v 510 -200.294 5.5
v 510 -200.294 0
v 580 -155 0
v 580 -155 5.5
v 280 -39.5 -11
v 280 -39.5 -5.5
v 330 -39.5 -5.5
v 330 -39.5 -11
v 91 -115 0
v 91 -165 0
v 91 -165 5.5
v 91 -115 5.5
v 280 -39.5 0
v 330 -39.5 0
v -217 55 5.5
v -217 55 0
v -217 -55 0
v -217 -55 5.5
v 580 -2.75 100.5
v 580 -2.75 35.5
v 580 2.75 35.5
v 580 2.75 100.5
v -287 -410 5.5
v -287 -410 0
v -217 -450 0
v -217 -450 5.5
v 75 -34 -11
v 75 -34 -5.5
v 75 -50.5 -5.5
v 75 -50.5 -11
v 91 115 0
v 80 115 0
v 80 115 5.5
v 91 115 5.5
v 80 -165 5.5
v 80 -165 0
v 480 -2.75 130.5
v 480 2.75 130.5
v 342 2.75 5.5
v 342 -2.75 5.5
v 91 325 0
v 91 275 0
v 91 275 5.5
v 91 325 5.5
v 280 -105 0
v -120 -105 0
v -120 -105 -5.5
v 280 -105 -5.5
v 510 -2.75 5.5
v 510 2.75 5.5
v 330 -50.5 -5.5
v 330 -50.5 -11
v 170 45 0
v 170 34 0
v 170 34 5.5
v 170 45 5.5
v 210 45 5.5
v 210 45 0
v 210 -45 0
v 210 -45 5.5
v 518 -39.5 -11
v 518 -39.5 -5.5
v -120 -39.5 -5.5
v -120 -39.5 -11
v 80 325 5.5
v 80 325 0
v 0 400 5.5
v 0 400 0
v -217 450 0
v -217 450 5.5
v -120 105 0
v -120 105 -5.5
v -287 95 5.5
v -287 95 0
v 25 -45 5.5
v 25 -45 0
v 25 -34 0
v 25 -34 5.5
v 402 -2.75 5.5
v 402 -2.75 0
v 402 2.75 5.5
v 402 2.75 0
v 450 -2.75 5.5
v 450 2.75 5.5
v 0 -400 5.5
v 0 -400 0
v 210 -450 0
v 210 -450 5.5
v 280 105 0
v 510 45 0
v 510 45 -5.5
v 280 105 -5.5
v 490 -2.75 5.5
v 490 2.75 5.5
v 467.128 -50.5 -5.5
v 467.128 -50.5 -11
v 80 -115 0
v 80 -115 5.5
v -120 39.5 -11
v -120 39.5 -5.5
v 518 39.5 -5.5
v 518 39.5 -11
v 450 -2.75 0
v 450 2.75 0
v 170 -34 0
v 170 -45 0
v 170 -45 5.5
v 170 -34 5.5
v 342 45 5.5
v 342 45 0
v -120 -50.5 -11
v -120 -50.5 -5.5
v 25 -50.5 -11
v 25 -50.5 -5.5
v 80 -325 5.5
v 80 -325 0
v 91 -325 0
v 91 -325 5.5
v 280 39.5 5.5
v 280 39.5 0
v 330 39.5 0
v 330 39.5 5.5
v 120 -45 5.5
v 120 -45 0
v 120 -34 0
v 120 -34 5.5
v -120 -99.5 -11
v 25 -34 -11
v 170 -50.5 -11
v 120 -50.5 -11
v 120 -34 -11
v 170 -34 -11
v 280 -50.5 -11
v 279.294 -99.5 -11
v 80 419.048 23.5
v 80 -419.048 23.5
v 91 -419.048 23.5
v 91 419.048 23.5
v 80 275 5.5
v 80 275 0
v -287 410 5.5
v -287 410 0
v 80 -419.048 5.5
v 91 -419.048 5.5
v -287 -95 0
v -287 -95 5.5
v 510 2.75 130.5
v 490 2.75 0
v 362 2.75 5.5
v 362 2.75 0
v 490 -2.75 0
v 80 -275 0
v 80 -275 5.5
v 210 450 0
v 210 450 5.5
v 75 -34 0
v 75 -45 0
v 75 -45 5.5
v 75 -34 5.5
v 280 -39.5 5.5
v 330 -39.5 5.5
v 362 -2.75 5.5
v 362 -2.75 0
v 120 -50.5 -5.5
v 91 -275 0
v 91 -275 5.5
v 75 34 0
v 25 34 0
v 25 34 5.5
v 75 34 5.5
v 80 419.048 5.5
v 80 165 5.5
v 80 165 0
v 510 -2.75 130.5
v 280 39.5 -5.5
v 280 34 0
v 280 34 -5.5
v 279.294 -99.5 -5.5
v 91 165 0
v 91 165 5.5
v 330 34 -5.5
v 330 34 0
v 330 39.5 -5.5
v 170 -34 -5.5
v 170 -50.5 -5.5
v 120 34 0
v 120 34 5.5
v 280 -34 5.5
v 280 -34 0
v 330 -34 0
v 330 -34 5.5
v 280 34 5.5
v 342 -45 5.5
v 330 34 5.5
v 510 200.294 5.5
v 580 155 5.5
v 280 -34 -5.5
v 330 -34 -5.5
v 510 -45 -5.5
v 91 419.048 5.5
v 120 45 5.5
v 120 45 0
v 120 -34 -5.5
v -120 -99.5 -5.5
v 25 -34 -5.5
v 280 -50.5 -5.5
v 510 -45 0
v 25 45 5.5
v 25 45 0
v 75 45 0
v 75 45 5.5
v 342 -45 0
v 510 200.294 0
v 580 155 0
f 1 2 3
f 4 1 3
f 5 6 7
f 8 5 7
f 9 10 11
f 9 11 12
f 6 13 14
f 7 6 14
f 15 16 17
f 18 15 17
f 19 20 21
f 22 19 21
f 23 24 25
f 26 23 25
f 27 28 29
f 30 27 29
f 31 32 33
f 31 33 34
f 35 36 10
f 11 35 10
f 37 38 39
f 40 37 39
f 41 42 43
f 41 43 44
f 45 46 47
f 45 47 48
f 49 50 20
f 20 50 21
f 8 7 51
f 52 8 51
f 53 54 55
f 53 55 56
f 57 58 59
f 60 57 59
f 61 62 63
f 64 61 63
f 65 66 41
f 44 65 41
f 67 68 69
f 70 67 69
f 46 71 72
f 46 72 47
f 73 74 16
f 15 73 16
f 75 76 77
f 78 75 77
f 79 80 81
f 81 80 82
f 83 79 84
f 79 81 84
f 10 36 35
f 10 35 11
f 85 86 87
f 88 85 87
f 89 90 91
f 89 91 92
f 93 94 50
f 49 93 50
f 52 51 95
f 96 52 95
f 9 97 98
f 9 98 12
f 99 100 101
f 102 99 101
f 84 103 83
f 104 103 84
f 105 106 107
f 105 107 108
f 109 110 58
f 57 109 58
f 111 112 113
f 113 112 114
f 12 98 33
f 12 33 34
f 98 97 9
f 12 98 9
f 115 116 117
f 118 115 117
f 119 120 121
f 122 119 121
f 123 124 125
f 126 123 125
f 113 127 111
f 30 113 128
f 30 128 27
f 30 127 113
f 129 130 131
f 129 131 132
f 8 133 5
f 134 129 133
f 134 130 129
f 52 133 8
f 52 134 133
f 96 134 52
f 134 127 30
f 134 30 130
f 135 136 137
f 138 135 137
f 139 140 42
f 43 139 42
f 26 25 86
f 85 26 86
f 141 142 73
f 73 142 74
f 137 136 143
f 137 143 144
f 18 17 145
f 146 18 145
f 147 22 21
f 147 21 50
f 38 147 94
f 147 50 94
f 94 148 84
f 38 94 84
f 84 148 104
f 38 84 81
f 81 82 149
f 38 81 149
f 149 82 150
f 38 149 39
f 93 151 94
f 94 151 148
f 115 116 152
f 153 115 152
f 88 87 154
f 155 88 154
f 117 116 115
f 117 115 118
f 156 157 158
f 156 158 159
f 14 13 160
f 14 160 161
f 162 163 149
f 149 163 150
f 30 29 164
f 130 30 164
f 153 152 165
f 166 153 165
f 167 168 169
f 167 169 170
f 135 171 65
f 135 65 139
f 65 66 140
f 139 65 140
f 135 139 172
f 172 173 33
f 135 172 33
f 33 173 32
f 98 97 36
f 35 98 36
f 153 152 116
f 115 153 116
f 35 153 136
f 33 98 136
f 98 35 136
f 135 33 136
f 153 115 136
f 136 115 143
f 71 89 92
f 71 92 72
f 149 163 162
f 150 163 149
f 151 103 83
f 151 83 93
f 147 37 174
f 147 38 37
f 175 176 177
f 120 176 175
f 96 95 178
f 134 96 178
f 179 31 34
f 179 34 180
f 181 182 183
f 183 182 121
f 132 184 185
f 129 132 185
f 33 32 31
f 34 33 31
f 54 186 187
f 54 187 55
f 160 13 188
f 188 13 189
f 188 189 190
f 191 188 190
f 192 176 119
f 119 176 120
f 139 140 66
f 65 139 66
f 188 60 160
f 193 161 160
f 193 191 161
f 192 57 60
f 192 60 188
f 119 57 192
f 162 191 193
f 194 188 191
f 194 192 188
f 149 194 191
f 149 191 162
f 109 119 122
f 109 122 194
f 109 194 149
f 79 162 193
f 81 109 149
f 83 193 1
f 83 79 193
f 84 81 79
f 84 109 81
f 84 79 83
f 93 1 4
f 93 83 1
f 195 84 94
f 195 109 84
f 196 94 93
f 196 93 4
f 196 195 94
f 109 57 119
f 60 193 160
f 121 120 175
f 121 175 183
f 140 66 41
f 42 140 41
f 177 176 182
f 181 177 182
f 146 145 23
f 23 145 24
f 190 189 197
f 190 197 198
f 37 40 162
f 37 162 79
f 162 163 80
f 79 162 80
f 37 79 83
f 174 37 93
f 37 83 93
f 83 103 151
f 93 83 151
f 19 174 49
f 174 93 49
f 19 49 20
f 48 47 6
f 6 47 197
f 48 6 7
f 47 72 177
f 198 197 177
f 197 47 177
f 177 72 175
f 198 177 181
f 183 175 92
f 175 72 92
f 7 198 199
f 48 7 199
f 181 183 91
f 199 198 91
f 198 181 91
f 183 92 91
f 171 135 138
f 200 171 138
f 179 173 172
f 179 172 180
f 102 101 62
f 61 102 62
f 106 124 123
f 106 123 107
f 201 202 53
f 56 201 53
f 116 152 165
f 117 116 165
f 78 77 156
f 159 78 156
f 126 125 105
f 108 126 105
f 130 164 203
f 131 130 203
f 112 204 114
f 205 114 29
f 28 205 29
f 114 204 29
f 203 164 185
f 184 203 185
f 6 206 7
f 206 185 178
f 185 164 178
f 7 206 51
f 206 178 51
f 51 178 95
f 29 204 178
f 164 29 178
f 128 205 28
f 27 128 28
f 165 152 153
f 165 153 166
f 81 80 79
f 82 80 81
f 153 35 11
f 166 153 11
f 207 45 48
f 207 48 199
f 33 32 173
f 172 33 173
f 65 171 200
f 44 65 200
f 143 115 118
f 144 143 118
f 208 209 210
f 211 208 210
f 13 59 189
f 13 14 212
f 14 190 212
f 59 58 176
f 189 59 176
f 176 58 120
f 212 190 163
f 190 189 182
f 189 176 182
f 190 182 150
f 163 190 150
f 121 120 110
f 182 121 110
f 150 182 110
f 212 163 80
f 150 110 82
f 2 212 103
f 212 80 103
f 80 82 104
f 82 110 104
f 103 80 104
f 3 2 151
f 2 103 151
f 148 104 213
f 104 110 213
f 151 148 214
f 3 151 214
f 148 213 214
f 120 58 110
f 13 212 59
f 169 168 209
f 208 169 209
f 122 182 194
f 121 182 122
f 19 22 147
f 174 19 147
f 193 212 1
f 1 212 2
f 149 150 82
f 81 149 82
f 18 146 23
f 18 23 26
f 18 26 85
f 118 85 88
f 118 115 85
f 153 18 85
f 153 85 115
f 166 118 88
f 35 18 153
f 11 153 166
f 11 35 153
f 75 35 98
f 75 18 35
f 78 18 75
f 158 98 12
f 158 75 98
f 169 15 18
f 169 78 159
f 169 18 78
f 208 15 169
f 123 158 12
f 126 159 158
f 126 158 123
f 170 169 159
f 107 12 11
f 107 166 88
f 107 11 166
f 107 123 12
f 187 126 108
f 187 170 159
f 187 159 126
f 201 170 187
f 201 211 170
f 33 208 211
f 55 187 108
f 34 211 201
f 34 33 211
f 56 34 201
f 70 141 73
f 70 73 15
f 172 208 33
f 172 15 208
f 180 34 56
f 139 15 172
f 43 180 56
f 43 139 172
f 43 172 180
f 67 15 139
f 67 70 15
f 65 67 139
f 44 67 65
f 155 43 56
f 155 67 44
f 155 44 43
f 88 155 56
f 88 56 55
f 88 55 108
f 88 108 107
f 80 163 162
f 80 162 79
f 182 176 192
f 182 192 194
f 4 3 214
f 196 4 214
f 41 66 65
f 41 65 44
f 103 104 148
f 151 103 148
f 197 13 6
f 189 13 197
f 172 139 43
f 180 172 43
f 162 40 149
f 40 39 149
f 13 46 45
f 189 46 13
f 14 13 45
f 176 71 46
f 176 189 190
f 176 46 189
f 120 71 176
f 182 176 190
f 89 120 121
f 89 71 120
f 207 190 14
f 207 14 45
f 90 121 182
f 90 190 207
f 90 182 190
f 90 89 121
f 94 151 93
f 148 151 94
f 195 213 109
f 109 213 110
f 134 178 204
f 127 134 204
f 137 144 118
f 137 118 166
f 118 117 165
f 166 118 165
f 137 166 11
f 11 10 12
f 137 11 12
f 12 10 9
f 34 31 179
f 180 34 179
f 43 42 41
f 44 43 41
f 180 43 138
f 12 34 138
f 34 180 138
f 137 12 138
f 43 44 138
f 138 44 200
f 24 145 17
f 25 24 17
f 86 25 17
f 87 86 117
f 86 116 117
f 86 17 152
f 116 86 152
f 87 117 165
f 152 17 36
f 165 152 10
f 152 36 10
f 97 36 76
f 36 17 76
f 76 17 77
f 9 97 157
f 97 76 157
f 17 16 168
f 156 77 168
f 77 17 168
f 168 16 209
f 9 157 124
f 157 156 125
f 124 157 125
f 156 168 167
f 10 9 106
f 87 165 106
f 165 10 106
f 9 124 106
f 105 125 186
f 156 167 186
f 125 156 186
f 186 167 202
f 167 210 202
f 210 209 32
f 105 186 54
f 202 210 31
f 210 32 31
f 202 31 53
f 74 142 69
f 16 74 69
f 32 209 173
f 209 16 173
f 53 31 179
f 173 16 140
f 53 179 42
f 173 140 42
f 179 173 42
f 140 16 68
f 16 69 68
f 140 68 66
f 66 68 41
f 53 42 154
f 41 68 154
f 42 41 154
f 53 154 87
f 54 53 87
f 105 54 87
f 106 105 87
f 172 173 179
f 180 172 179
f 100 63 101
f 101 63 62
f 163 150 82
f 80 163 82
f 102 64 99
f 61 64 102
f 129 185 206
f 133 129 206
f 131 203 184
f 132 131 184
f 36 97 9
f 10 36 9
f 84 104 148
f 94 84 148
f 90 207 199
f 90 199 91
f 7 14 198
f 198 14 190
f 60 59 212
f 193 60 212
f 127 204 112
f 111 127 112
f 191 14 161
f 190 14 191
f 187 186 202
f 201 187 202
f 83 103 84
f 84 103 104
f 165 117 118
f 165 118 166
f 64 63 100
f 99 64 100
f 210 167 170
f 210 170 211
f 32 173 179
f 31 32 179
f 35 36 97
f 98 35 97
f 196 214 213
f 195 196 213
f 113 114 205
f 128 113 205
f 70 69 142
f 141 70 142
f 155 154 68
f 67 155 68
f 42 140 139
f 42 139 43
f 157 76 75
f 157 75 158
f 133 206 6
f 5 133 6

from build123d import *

# Parameters (mm, degrees)
F0_W      = 11
F0_H      = 50
F0_W_2    = 50
F0_H_2    = 11
F1_DEPTH  = 5.5
F2_W      = 11
F2_H      = 94.0476190476
F2_H_2    = 50
F2_H_3    = 110
F2_H_4    = 230
F3_DEPTH  = 18
F4_DEPTH  = 5.5
F5_W      = 50
F5_H      = 5.5
F5_W_2    = 120
F5_H_2    = 60
F6_DEPTH  = 5.5
F8_DEPTH  = 5.5
F9_W      = 50
F9_H      = 5.5
F9_W_2    = 40
F10_DEPTH = 5.5
F11_W     = 40
F11_H     = 5.5
F11_W_2   = 48
F11_W_3   = 20
F12_DEPTH = 125
F13_DEPTH = 5.5
F15_DEPTH = 5.5
F16_W     = 50
F16_H     = 5.5
F17_DEPTH = 5.5


# Not quite as in the source:
# - a feature names something its author has since deleted; it is built from what else it names


with BuildPart() as f1:
    # F0 (on Top) → F1 (new body)
    with BuildSketch(Plane.XY):
        Polygon((0, -400), (0, 0), (0, 400), (-217, 450), (-217, 400), (-217, 55), (-217, -55), (-217, -450), align=None)
        Polygon((-217, 400), (-217, 450), (-287, 410), (-287, 95), (-217, 55), align=None)
        Polygon((0, 400), (0, 0), (0, -400), (210, -450), (210, 0), (210, 450), align=None)
        with Locations((85.5, -300)):
            Rectangle(F0_W, F0_H, mode=Mode.SUBTRACT)
        with Locations((85.5, -140)):
            Rectangle(F0_W, F0_H, mode=Mode.SUBTRACT)
        with Locations((50, -39.5)):
            Rectangle(F0_W_2, F0_H_2, mode=Mode.SUBTRACT)
        with Locations((145, -39.5)):
            Rectangle(F0_W_2, F0_H_2, mode=Mode.SUBTRACT)
        with Locations((50, 39.5)):
            Rectangle(F0_W_2, F0_H_2, mode=Mode.SUBTRACT)
        with Locations((85.5, 140)):
            Rectangle(F0_W, F0_H, mode=Mode.SUBTRACT)
        with Locations((145, 39.5)):
            Rectangle(F0_W_2, F0_H_2, mode=Mode.SUBTRACT)
        with Locations((85.5, 300)):
            Rectangle(F0_W, F0_H, mode=Mode.SUBTRACT)
        Polygon((-287, -410), (-217, -450), (-217, -55), (-287, -95), align=None)
    extrude(amount=F1_DEPTH)


with BuildPart() as f3:
    # F2 (on face) → F3 (new body)
    with BuildSketch(Plane.XY.offset(5.5)):
        with Locations((85.5, -372.0238095238)):
            Rectangle(F2_W, F2_H)
        with Locations((85.5, -300)):
            Rectangle(F2_W, F2_H_2)
        with Locations((85.5, -220)):
            Rectangle(F2_W, F2_H_3)
        with Locations((85.5, -140)):
            Rectangle(F2_W, F2_H_2)
        with Locations((85.5, 0)):
            Rectangle(F2_W, F2_H_4)
        with Locations((85.5, 140)):
            Rectangle(F2_W, F2_H_2)
        with Locations((85.5, 220)):
            Rectangle(F2_W, F2_H_3)
        with Locations((85.5, 372.0238095238)):
            Rectangle(F2_W, F2_H)
        with Locations((85.5, 300)):
            Rectangle(F2_W, F2_H_2)
    extrude(amount=F3_DEPTH)

    # F0 (on Top) → F4 (join)
    with BuildSketch(Plane.XY):
        with Locations((85.5, -300)):
            Rectangle(F0_W, F0_H)
        with Locations((85.5, -140)):
            Rectangle(F0_W, F0_H)
        with Locations((85.5, 140)):
            Rectangle(F0_W, F0_H)
        with Locations((85.5, 300)):
            Rectangle(F0_W, F0_H)
    extrude(amount=F4_DEPTH)


with BuildPart() as f6:
    # F5 (on face) → F6 (new body)
    with BuildSketch(Plane.XY):
        Polygon((280, -105), (510, -45), (210, -45), (170, -45), (170, -34), (120, -34), (120, -45), (75, -45), (75, -34), (25, -34), (25, -45), (0, -45), (0, -105), align=None)
        Polygon((170, 34), (120, 34), (120, 45), (75, 45), (75, 34), (25, 34), (25, 45), (0, 45), (0, 0), (0, -45), (25, -45), (25, -34), (75, -34), (75, -45), (120, -45), (120, -34), (170, -34), (170, -45), (210, -45), (510, -45), (510, 0), (510, 45), (210, 45), (170, 45), align=None)
        with Locations((305, -36.75)):
            Rectangle(F5_W, F5_H, mode=Mode.SUBTRACT)
        with Locations((305, 36.75)):
            Rectangle(F5_W, F5_H, mode=Mode.SUBTRACT)
        Polygon((120, 45), (120, 34), (170, 34), (170, 45), (210, 45), (510, 45), (280, 105), (0, 105), (0, 45), (25, 45), (25, 34), (75, 34), (75, 45), align=None)
        with Locations((-60, 75)):
            Rectangle(F5_W_2, F5_H_2)
        Polygon((0, 0), (0, 45), (-120, 45), (-120, -45), (0, -45), align=None)
        with Locations((-60, -75)):
            Rectangle(F5_W_2, F5_H_2)
    extrude(amount=-F6_DEPTH)


with BuildPart() as f8:
    # F7 (on face) → F8 (new body)
    with BuildSketch(Plane(origin=(0, 0, -5.5), x_dir=(1, 0, 0), z_dir=(0, 0, -1))):
        Polygon((-120, 99.5), (-120, 50.5), (25, 50.5), (25, 39.5), (25, 34), (75, 34), (75, 39.5), (75, 50.5), (120, 50.5), (120, 39.5), (120, 34), (170, 34), (170, 39.5), (170, 50.5), (280, 50.5), (280, 39.5), (330, 39.5), (330, 50.5), (467.1277487393, 50.5), (279.294415406, 99.5), align=None)
    extrude(amount=F8_DEPTH)


with BuildPart() as f10:
    # F9 (on face) → F10 (new body)
    with BuildSketch(Plane.XY):
        Polygon((580, 155), (510, 200.2941176471), (510, 45), (510, 0), (510, -45), (510, -200.2941176471), (580, -155), (580, 0), align=None)
        Polygon((510, -45), (342, -45), (510, -200.2941176471), align=None)
        Polygon((342, 45), (210, 45), (210, -45), (342, -45), (510, -45), (510, 0), (510, 45), align=None)
        with Locations((305, -36.75)):
            Rectangle(F9_W, F9_H, mode=Mode.SUBTRACT)
        with Locations((382, 0)):
            Rectangle(F9_W_2, F9_H, mode=Mode.SUBTRACT)
        with Locations((470, 0)):
            Rectangle(F9_W_2, F9_H, mode=Mode.SUBTRACT)
        with Locations((305, 36.75)):
            Rectangle(F9_W, F9_H, mode=Mode.SUBTRACT)
        Polygon((510, 200.2941176471), (342, 45), (510, 45), align=None)
    extrude(amount=F10_DEPTH)


with BuildPart() as f12:
    # F11 (on face) → F12 (new body)
    with BuildSketch(Plane.XY.offset(5.5)):
        Polygon((490, 2.75), (490, -2.75), (510, -2.75), (510, 0), (510, 2.75), align=None)
        Polygon((510, 0), (510, -2.75), (580, -2.75), (580, 2.75), (510, 2.75), align=None)
        with Locations((470, 0)):
            Rectangle(F11_W, F11_H)
        with Locations((426, 0)):
            Rectangle(F11_W_2, F11_H)
        with Locations((382, 0)):
            Rectangle(F11_W, F11_H)
        with Locations((352, 0)):
            Rectangle(F11_W_3, F11_H)
    extrude(amount=F12_DEPTH)

    # F9 (on face) → F13 (join)
    with BuildSketch(Plane.XY):
        with Locations((470, 0)):
            Rectangle(F9_W_2, F9_H)
        with Locations((382, 0)):
            Rectangle(F9_W_2, F9_H)
    extrude(amount=F13_DEPTH)

    # F14 (on face) → F15 (cut, through all)
    with BuildSketch(Plane(origin=(0, 2.75, 0), x_dir=(-1, 0, 0), z_dir=(0, 1, 0))):
        Polygon((-580, 100.5), (-510, 130.5), (-580, 130.5), align=None)
        Polygon((-580, 5.5), (-510, 5.5), (-580, 35.5), align=None)
        Polygon((-342, 130.5), (-480, 130.5), (-342, 5.5), align=None)
    extrude(amount=-F15_DEPTH, mode=Mode.SUBTRACT)


with BuildPart() as f17:
    # F16 (on face) → F17 (new body)
    with BuildSketch(Plane(origin=(0, 0, -5.5), x_dir=(1, 0, 0), z_dir=(0, 0, -1))):
        Polygon((510, 39.5), (510, -39.5), (518, -39.5), (518, 0), (518, 39.5), align=None)
        with Locations((305, -36.75)):
            Rectangle(F16_W, F16_H)
        Polygon((330, -34), (330, -39.5), (510, -39.5), (510, 39.5), (330, 39.5), (330, 34), (280, 34), (280, -34), align=None)
        Polygon((-120, 0), (-120, -39.5), (280, -39.5), (280, -34), (280, 34), (280, 39.5), (-120, 39.5), align=None)
        with Locations((305, 36.75)):
            Rectangle(F16_W, F16_H)
    extrude(amount=F17_DEPTH)


solid = Compound([f1.part, f3.part, f6.part, f8.part, f10.part, f12.part, f17.part])
